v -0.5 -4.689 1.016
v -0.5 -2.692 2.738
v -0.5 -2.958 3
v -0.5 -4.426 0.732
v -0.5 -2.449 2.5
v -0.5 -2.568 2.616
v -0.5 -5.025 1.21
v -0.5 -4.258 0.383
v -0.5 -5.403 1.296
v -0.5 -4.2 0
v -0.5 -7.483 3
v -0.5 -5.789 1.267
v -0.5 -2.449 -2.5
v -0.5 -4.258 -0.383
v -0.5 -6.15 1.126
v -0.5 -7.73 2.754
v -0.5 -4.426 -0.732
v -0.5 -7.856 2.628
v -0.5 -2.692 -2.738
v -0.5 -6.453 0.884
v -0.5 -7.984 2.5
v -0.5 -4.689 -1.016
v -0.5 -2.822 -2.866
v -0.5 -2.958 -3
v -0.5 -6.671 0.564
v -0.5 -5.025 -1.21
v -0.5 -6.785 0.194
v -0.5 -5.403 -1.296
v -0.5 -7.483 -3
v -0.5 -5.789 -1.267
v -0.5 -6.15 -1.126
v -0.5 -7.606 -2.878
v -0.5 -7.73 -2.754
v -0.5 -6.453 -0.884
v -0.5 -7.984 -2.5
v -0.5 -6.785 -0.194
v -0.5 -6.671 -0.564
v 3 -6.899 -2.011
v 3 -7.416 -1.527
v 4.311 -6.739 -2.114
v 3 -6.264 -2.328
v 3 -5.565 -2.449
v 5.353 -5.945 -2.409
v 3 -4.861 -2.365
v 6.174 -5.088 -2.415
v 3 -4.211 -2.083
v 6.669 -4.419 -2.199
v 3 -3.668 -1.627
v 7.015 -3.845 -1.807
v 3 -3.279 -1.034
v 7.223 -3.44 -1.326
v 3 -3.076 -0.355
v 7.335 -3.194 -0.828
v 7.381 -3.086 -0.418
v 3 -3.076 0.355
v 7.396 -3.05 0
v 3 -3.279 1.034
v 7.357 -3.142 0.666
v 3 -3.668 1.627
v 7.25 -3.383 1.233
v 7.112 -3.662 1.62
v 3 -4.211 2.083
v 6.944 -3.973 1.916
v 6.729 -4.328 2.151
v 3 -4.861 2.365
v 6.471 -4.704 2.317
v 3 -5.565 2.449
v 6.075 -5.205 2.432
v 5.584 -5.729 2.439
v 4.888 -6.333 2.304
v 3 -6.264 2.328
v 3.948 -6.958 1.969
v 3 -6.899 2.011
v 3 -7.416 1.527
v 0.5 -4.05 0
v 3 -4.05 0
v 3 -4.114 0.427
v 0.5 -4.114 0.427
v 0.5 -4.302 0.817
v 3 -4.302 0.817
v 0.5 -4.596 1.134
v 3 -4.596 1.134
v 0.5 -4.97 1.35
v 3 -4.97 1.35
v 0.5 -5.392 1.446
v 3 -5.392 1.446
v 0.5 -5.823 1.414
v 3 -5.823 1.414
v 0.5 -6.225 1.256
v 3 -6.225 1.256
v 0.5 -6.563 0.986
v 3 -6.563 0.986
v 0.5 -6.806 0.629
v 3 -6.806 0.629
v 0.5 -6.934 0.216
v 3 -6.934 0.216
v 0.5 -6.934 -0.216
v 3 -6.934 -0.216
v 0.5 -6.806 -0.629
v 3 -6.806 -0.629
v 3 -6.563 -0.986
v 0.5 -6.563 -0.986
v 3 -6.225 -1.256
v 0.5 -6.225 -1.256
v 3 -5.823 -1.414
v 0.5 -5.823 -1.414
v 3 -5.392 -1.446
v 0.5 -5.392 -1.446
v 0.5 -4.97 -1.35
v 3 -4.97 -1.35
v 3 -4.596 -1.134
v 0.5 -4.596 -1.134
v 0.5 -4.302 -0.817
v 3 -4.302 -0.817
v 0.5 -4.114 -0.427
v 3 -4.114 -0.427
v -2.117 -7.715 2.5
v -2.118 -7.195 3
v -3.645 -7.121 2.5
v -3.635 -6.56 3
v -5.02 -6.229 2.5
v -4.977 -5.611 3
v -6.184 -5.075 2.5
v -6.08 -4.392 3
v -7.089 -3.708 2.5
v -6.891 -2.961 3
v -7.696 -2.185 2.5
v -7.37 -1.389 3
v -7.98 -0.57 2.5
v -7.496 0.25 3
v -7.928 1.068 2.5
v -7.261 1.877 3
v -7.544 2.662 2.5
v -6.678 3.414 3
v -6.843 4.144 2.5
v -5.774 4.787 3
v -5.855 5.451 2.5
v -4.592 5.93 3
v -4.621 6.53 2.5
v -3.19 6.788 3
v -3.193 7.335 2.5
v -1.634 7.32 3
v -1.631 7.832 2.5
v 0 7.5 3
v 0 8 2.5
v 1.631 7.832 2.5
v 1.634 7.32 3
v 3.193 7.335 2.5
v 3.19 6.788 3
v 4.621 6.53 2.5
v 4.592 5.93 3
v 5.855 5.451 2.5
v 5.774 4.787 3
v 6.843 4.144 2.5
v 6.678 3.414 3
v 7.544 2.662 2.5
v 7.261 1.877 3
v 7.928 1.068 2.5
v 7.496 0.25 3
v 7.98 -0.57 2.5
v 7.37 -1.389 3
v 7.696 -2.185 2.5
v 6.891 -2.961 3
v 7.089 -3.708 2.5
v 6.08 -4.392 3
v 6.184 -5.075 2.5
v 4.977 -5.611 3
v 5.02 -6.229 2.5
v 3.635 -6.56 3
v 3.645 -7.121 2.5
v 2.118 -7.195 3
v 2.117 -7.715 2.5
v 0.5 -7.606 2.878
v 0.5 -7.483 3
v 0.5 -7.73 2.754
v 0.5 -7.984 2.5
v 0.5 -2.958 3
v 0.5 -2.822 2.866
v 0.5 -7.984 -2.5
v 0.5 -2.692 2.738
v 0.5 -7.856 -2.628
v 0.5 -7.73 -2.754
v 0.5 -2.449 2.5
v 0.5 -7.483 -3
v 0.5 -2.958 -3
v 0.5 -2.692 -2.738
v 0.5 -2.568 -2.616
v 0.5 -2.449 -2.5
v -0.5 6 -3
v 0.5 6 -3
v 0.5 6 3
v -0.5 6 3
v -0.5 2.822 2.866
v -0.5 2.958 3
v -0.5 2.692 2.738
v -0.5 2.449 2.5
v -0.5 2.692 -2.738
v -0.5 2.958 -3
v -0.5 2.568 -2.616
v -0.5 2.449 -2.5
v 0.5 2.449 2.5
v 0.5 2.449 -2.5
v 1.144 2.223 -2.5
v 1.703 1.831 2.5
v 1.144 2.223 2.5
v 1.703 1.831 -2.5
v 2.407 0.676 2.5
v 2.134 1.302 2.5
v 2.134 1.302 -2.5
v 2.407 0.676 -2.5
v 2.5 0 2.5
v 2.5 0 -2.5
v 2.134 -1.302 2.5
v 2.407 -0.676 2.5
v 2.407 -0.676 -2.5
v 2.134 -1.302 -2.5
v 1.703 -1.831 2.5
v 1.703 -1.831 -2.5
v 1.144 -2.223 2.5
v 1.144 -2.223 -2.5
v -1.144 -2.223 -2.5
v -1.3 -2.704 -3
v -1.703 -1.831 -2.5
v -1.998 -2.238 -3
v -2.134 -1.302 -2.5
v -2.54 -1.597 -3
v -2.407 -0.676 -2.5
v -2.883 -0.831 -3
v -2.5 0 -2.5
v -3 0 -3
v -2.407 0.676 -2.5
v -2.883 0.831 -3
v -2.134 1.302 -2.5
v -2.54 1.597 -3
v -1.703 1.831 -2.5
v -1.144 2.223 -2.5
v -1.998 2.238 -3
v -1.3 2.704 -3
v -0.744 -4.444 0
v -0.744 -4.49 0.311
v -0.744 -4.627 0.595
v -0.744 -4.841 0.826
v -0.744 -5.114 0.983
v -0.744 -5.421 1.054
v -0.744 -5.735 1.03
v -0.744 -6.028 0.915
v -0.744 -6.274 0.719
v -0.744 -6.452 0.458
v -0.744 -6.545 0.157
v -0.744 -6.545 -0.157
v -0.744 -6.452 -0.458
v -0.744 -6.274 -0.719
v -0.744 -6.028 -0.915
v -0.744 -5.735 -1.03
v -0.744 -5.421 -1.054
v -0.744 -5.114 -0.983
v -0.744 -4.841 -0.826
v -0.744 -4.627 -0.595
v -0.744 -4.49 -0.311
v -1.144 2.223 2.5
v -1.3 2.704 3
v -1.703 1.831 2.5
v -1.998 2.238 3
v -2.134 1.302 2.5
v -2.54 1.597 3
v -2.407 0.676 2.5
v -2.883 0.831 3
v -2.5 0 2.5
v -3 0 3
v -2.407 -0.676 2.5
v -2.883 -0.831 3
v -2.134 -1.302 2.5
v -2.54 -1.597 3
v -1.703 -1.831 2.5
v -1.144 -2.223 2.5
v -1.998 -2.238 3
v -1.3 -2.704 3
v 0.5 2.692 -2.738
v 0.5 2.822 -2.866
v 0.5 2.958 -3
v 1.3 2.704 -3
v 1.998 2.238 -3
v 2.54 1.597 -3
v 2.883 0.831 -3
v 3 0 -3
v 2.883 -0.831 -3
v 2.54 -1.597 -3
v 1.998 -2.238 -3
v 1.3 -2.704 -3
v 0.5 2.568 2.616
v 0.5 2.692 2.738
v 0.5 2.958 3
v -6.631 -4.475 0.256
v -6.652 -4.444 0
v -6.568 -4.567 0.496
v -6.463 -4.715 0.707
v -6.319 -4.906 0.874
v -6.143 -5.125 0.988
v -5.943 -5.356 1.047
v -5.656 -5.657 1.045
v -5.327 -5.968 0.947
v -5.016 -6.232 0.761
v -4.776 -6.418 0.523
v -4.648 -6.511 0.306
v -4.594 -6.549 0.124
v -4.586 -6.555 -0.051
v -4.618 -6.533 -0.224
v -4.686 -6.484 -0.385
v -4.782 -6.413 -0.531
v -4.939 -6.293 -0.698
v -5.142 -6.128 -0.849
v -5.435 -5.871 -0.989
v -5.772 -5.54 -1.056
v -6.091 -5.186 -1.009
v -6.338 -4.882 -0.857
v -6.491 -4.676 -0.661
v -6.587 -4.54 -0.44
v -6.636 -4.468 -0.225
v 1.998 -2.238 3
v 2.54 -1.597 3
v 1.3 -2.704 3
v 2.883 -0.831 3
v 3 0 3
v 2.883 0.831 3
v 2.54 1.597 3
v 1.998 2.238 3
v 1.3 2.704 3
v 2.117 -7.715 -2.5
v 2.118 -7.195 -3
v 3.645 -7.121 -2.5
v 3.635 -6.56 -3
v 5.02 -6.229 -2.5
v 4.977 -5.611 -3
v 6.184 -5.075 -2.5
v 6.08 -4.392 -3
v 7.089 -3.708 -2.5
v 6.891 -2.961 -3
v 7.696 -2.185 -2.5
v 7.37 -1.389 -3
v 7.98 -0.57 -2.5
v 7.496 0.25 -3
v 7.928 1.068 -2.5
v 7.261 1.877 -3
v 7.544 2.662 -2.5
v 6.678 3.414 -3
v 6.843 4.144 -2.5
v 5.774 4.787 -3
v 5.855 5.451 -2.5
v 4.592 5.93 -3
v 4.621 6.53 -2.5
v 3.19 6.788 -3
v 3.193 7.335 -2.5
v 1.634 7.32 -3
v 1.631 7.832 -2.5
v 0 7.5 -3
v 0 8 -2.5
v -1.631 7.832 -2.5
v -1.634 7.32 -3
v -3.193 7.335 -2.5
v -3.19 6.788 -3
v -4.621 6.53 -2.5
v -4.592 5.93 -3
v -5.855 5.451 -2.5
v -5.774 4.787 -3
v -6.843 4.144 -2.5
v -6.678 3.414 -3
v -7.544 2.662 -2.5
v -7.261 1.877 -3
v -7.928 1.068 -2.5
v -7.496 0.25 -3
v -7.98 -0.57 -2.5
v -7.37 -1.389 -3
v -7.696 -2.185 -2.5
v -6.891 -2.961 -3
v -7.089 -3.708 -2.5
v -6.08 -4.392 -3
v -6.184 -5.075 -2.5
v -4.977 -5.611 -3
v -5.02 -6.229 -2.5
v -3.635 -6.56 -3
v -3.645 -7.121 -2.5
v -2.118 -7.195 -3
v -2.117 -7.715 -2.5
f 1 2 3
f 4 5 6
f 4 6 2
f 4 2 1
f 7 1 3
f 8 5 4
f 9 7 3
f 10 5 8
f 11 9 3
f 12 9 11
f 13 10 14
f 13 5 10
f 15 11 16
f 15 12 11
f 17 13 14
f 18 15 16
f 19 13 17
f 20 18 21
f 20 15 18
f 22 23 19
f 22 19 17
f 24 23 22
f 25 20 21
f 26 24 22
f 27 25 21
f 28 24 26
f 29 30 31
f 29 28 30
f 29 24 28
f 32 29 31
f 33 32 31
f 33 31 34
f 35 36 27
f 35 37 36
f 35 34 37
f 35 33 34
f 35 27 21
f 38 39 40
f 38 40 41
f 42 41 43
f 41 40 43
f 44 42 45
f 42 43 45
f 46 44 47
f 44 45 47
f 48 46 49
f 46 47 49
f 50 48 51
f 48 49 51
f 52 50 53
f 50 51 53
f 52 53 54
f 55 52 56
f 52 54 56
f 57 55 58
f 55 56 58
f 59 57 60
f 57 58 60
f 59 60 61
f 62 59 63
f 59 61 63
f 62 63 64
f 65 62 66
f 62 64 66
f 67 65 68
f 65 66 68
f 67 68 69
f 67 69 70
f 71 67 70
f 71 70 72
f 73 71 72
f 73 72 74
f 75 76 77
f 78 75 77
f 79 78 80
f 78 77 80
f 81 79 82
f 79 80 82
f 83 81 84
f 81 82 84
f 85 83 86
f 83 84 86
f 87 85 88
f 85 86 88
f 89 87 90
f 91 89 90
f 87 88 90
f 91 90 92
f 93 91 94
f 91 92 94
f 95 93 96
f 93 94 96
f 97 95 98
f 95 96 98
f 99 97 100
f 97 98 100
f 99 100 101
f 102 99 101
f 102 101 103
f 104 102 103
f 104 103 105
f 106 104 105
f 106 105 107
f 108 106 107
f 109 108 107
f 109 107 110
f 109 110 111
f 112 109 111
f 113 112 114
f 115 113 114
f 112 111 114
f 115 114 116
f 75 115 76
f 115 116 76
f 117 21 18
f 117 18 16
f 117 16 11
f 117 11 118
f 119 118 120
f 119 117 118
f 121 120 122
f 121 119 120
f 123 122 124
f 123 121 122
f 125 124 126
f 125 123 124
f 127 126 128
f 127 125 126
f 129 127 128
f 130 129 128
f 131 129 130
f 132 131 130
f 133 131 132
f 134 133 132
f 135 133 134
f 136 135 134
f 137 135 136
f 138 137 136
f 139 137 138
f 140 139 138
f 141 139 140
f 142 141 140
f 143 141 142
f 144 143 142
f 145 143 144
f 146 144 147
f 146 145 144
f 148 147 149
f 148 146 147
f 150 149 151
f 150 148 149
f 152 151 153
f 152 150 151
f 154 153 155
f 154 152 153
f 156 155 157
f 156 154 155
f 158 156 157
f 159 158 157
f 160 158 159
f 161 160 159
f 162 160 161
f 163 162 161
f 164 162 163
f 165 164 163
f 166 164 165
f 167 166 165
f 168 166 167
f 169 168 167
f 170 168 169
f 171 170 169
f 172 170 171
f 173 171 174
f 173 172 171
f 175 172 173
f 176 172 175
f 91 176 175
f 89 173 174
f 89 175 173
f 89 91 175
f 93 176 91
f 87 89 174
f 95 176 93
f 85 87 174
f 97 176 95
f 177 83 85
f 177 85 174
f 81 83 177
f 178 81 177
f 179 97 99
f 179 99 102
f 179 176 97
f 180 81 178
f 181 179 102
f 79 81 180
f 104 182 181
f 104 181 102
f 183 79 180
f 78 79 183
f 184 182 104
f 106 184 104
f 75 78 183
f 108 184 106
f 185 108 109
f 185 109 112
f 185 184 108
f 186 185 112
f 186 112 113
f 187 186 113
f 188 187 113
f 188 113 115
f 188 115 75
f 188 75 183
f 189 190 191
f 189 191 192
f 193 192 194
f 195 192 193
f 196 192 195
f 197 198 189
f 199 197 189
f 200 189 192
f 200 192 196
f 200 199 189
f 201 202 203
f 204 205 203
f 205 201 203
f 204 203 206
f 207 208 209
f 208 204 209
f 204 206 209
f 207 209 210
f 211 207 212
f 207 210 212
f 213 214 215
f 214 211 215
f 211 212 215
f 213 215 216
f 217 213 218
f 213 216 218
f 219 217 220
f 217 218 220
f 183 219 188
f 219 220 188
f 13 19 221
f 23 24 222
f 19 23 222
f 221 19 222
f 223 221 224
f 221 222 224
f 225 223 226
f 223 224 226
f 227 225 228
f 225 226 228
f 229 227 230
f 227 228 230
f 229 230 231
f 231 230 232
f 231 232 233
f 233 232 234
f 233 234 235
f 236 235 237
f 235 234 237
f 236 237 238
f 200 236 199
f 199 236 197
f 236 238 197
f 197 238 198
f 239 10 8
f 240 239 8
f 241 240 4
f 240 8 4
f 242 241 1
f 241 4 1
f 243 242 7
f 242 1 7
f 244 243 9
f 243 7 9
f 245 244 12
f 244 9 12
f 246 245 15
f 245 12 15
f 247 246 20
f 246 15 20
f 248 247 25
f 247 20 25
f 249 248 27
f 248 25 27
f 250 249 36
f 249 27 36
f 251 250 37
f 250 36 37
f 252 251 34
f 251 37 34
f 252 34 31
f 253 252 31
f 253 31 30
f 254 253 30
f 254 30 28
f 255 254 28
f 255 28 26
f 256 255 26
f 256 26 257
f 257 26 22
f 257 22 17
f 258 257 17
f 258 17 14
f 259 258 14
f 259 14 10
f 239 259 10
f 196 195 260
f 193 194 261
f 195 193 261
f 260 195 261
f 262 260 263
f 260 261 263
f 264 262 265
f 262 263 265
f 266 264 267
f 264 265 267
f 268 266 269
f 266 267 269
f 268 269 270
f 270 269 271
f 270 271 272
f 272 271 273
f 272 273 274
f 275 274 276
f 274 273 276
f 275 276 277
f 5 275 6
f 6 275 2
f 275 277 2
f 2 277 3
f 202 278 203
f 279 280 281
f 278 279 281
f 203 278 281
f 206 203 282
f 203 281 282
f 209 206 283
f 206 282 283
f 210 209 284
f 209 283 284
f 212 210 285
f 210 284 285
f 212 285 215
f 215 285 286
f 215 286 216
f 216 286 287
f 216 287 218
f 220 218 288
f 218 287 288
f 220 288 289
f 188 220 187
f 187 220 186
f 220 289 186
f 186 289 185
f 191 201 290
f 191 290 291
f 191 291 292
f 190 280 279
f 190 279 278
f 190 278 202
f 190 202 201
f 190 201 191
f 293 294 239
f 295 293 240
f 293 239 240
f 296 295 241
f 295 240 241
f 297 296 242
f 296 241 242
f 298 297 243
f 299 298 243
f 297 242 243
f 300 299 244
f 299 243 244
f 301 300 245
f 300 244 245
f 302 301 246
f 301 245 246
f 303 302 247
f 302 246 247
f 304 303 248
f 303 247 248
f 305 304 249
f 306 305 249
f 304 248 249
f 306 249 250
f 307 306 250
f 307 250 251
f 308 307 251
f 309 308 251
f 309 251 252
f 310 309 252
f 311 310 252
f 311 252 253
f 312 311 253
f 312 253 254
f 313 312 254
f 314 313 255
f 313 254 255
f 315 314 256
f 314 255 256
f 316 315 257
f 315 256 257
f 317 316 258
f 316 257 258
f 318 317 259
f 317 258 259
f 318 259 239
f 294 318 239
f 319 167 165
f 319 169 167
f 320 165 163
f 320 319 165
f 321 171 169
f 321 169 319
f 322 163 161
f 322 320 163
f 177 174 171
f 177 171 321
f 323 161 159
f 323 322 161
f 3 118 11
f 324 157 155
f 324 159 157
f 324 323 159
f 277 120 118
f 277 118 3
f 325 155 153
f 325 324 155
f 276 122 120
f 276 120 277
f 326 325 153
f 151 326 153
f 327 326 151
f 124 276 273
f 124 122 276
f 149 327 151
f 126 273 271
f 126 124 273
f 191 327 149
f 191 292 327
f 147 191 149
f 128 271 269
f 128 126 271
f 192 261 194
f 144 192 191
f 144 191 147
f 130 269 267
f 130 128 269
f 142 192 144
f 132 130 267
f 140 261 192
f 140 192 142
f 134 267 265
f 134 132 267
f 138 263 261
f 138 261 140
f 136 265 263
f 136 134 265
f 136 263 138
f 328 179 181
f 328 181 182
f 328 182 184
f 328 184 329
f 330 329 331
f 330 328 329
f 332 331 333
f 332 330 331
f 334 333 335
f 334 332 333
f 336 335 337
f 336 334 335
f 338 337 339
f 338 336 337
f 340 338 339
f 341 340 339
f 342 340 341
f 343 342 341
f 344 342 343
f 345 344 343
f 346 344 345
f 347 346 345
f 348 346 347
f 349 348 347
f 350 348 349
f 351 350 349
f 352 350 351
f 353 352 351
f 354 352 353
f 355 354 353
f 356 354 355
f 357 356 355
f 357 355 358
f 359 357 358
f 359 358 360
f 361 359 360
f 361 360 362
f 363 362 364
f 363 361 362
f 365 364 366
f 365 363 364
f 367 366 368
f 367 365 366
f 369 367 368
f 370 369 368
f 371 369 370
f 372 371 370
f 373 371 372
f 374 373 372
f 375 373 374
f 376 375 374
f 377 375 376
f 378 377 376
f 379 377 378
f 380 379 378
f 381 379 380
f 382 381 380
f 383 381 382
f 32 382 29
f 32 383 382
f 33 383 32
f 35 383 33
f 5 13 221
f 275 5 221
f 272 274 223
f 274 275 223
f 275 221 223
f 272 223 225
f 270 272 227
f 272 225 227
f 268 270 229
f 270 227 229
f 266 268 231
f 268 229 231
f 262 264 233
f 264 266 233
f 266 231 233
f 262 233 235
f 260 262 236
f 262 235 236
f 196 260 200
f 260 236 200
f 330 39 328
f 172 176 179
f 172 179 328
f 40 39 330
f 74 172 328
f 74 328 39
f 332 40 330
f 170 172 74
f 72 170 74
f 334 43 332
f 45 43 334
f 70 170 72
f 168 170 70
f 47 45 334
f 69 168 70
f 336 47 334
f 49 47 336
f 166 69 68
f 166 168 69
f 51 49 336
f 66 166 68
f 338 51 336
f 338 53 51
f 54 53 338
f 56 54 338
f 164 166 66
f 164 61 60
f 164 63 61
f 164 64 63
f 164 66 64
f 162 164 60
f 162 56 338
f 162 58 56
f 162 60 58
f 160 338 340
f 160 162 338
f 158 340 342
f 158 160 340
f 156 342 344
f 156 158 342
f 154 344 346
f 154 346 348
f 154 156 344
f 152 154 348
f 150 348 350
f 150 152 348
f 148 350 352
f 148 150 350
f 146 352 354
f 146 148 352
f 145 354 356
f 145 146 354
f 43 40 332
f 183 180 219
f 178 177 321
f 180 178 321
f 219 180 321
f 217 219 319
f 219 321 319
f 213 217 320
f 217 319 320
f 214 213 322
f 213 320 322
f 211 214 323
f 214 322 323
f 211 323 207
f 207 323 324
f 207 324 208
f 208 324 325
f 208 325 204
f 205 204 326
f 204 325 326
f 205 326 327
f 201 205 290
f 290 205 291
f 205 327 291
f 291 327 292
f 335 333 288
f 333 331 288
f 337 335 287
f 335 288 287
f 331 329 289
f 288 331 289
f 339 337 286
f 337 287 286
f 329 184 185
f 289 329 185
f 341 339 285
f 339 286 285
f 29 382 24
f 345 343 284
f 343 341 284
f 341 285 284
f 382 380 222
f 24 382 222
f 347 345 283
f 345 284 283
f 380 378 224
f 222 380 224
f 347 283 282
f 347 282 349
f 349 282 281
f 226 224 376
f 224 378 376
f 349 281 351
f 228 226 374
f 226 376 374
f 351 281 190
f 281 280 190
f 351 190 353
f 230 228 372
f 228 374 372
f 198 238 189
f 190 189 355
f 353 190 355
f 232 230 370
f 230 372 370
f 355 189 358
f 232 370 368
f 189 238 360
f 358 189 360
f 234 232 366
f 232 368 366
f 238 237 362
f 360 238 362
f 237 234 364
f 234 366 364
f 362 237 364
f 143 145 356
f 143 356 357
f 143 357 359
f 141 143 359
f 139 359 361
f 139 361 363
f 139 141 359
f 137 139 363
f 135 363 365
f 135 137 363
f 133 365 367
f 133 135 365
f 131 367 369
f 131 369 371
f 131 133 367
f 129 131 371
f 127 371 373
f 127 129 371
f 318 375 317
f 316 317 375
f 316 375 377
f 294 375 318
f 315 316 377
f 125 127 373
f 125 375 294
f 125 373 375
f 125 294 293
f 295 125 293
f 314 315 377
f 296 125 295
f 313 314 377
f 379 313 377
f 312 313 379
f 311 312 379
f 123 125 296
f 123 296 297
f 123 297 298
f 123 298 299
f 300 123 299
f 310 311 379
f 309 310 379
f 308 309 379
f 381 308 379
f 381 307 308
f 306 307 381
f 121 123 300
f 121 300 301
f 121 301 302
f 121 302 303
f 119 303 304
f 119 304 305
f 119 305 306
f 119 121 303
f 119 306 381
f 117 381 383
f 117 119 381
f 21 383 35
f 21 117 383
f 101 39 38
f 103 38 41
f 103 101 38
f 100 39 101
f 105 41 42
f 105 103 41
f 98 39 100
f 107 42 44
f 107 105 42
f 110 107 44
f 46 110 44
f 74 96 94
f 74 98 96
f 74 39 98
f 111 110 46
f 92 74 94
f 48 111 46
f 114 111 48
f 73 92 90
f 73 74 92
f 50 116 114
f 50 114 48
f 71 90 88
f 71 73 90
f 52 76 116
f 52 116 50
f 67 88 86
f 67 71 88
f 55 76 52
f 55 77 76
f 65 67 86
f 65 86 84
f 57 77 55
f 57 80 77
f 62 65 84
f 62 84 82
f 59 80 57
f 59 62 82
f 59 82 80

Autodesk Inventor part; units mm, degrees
sketch "Sketch_1" plane through (0, 0, 0) normal (1, 0, 0) x (0, 1, 0)
  line L0 (0, -5) -> (0, 5)
  line L1 (7.5, 3) -> (3, 3)
  line L2 (3, 3) -> (2.5, 2.5)
  line L3 (2.5, 2.5) -> (2.5, -2.5)
  line L4 (2.5, -2.5) -> (3, -3)
  line L5 (3, -3) -> (7.5, -3)
  line L6 (7.5, -3) -> (8, -2.5)
  line L7 (8, -2.5) -> (8, 2.5)
  line L8 (8, 2.5) -> (7.5, 3)
revolve "Revolution1" add sketch "Sketch_1" angle 360 about axis through (0, 0, -5) along (0, 0, 1)
sketch "Sketch_2" plane through (0, 0, 0) normal (0, 0, 1) x (1, 0, 0)
  line L0 (9.6, -5.5) -> (0.5, -5.5)
  line L1 (0.5, -5.5) -> (0.5, -4.05)
  line L2 (0.5, -4.05) -> (3, -4.05)
  line L3 (3, -4.05) -> (3, -3.05)
  line L4 (3, -3.05) -> (9.6, -3.05)
  line L5 (9.6, -3.05) -> (9.6, -5.5)
  line L6 (9.6, -5.5) -> (0.5, -5.5)
revolve "Revolution2" cut sketch "Sketch_2" angle 360 about axis through (9.6, -5.5, 0) along (1, 0, 0)
sketch "Sketch_3" plane through (0, 0, 0) normal (0, 0, 1) x (1, 0, 0)
  line L0 (-0.5, -5.5) -> (-8, -5.5)
  line L1 (-8, -5.5) -> (-8, -4.4435)
  line L2 (-8, -4.4435) -> (-0.7435, -4.4435)
  line L3 (-0.7435, -4.4435) -> (-0.5, -4.2)
  line L4 (-0.5, -4.2) -> (-0.5, -5.5)
  line L5 (-0.5, -5.5) -> (-8, -5.5)
revolve "Revolution3" cut sketch "Sketch_3" angle 360 about axis through (-0.5, -5.5, 0) along (1, 0, 0)
thread "Thread1" size "M2.6x0.45" class "6H" standard "ISO Metric profile" full length
sketch "Sketch_5" plane through (0, 0, 0) normal (0, 0, 1) x (1, 0, 0)
  line L0 (-0.5, 6) -> (-0.5, -9.6)
  line L1 (-0.5, -9.6) -> (0.5, -9.6)
  line L2 (0.5, -9.6) -> (0.5, 6)
  line L3 (0.5, 6) -> (-0.5, 6)
extrude "Extrusion1" cut sketch "Sketch_5" along normal mid plane 6
ref_plane "to_screw_XY" through (3, -5.5, 0) normal (1, 0, 0) x (0, 0, -1)
ref_plane "to_screw_YZ" through (3, -5.5, 0) normal (0, 0, -1) x (0, 1, 0)
ref_plane "to_screw_ZX" through (3, -5.5, 0) normal (0, 1, 0) x (1, 0, 0)
properties part number "SSCSJ5-6b"
